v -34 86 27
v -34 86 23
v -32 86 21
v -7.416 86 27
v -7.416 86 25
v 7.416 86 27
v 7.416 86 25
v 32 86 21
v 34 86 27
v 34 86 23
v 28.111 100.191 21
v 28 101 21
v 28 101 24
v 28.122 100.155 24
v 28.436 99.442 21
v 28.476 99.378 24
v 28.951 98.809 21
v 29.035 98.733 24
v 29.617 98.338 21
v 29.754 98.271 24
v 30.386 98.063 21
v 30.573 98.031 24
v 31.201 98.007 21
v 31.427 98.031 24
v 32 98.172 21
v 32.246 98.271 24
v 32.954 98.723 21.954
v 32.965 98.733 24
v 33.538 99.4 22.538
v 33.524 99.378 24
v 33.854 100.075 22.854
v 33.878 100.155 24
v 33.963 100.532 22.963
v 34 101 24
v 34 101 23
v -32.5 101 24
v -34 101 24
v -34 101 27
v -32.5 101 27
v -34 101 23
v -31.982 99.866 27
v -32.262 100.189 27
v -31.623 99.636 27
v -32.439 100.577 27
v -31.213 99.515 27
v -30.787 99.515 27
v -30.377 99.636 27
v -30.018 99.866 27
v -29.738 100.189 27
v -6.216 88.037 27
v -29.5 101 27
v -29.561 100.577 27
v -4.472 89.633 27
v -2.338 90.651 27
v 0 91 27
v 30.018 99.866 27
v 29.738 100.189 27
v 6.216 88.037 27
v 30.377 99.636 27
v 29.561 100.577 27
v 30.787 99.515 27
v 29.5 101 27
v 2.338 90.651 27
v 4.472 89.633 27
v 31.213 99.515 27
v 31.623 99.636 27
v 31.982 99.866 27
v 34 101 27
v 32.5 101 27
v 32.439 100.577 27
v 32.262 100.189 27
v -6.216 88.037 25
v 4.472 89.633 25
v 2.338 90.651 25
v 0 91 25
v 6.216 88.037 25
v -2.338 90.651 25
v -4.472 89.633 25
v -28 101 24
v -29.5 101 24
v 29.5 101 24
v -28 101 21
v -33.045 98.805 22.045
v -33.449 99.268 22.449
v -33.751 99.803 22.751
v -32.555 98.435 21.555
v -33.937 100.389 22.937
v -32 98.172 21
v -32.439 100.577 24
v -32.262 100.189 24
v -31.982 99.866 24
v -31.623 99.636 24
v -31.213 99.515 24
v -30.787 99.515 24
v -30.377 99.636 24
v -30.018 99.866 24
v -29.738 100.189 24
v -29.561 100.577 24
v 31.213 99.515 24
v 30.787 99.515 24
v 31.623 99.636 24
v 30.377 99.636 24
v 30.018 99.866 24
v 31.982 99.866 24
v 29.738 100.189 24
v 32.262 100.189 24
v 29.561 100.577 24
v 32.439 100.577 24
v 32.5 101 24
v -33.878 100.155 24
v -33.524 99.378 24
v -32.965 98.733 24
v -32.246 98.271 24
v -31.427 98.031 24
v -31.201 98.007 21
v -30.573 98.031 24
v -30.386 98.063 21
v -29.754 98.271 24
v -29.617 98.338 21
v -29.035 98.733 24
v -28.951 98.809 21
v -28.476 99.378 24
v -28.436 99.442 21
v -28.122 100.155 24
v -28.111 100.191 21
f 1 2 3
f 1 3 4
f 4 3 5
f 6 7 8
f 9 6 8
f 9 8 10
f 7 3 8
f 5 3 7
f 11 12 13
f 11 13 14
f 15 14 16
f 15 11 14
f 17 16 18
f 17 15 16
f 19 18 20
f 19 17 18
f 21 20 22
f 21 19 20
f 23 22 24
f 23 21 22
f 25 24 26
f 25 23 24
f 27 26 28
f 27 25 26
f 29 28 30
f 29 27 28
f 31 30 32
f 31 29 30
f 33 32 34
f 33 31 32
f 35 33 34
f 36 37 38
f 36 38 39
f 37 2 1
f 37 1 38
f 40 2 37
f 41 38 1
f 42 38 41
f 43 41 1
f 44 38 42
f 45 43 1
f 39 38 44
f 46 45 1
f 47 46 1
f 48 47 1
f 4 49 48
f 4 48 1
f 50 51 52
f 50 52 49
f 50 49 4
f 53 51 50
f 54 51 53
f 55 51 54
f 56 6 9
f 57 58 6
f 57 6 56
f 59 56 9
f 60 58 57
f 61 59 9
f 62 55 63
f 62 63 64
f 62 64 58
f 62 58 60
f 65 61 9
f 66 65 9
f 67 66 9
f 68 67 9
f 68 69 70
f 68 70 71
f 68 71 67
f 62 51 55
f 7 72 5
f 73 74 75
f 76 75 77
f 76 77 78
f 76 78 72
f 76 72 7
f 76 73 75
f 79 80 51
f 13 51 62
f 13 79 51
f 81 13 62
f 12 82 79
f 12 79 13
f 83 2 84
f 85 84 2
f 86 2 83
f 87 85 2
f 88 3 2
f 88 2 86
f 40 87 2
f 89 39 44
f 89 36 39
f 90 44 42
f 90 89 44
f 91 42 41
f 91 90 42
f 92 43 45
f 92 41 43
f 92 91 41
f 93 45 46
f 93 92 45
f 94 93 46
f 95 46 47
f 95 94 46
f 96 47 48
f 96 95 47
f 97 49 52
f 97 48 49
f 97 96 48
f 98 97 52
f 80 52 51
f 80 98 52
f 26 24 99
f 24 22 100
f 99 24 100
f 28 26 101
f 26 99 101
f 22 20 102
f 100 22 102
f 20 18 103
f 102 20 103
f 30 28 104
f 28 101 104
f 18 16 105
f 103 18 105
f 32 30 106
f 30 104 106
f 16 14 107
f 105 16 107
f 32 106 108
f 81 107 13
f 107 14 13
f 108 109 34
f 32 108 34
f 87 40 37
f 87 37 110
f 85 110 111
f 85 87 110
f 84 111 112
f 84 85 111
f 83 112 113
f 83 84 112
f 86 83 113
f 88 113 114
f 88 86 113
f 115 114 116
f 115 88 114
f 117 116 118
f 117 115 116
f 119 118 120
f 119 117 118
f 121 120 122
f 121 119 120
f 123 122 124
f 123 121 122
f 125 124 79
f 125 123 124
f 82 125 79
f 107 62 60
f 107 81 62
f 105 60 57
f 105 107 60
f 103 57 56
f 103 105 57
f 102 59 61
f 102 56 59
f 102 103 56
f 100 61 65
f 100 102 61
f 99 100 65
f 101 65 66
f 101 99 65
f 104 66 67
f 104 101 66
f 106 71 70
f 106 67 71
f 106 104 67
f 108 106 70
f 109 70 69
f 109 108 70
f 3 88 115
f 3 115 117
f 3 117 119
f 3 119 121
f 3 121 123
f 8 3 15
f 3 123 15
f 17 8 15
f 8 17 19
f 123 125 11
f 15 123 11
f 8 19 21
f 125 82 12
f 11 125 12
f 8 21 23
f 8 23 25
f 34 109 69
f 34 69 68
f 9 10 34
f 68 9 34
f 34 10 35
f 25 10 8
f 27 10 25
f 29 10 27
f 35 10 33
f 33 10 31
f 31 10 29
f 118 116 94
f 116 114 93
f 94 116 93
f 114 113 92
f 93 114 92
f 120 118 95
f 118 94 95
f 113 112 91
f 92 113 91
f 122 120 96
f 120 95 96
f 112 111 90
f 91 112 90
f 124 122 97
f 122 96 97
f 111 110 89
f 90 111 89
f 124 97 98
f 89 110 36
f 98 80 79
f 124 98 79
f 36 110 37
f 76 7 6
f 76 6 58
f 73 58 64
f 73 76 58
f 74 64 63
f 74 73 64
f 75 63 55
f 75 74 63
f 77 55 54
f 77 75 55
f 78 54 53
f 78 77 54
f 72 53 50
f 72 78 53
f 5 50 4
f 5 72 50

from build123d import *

# Parameters (mm, degrees)
CYLINDER2097_R               = 1.5
CYLINDER2097_DEPTH           = 50
CYLINDER2097_PLACEMENT_ANGLE = 45
CYLINDER2083_R               = 1.5
CYLINDER2083_DEPTH           = 50
CYLINDER2083_PLACEMENT_ANGLE = 45
CYLINDER2096_R               = 1.5
CYLINDER2096_DEPTH           = 50
CYLINDER2096_PLACEMENT_ANGLE = 45
CYLINDER2092_R               = 1.5
CYLINDER2092_DEPTH           = 50
CYLINDER2092_PLACEMENT_ANGLE = 45
CYLINDER2095_R               = 1.5
CYLINDER2095_DEPTH           = 50
CYLINDER2095_PLACEMENT_ANGLE = 45
CYLINDER2094_R               = 1.5
CYLINDER2094_DEPTH           = 50
CYLINDER2094_PLACEMENT_ANGLE = 45
CYLINDER2076_R               = 3
CYLINDER2076_DEPTH           = 3
CYLINDER2076_PLACEMENT_ANGLE = 45
CYLINDER2065_R               = 3
CYLINDER2065_DEPTH           = 3
CYLINDER2065_PLACEMENT_ANGLE = 45
CYLINDER2074_R               = 3
CYLINDER2074_DEPTH           = 3
CYLINDER2074_PLACEMENT_ANGLE = 45
CYLINDER2064_R               = 3
CYLINDER2064_DEPTH           = 3
CYLINDER2064_PLACEMENT_ANGLE = 45
CYLINDER2063_R               = 3
CYLINDER2063_DEPTH           = 3
CYLINDER2063_PLACEMENT_ANGLE = 45
CYLINDER2070_R               = 3
CYLINDER2070_DEPTH           = 3
CYLINDER2070_PLACEMENT_ANGLE = 45
CYLINDER2071_R               = 8
CYLINDER2071_DEPTH           = 6
BOX989_W                     = 68
BOX989_H                     = 15
BOX989_DEPTH                 = 6
CHAMFER081_SIZE              = 2


with BuildPart() as v_lec2097:
    # Cylinder2097 → Cylinder2097 (new body)
    with BuildSketch(Plane.XY):
        Circle(CYLINDER2097_R)
    extrude(amount=CYLINDER2097_DEPTH)


with BuildPart() as v_lec2097_1:
    # Cylinder2097 placement: moved
    add(v_lec2097.part.moved(Location((20, 137, 0))).rotate(Axis((20, 137, 0), (0, 0, 1)), CYLINDER2097_PLACEMENT_ANGLE))


with BuildPart() as compound1087:
    # Cylinder2083 → Cylinder2083 (new body)
    with BuildSketch(Plane.XY):
        Circle(CYLINDER2083_R)
    extrude(amount=CYLINDER2083_DEPTH)


with BuildPart() as compound1087_1:
    # Cylinder2083 placement: moved
    add(compound1087.part.moved(Location((-20, 137, 0))).rotate(Axis((-20, 137, 0), (0, 0, 1)), CYLINDER2083_PLACEMENT_ANGLE))

    # Compound1087: union Válec2097
    add(v_lec2097_1.part)


with BuildPart() as v_lec2096:
    # Cylinder2096 → Cylinder2096 (new body)
    with BuildSketch(Plane.XY):
        Circle(CYLINDER2096_R)
    extrude(amount=CYLINDER2096_DEPTH)


with BuildPart() as v_lec2096_1:
    # Cylinder2096 placement: moved
    add(v_lec2096.part.moved(Location((31, 131, 0))).rotate(Axis((31, 131, 0), (0, 0, 1)), CYLINDER2096_PLACEMENT_ANGLE))


with BuildPart() as compound1088:
    # Cylinder2092 → Cylinder2092 (new body)
    with BuildSketch(Plane.XY):
        Circle(CYLINDER2092_R)
    extrude(amount=CYLINDER2092_DEPTH)


with BuildPart() as compound1088_1:
    # Cylinder2092 placement: moved
    add(compound1088.part.moved(Location((-31, 131, 0))).rotate(Axis((-31, 131, 0), (0, 0, 1)), CYLINDER2092_PLACEMENT_ANGLE))

    # Compound1088: union Válec2096
    add(v_lec2096_1.part)


with BuildPart() as v_lec2095:
    # Cylinder2095 → Cylinder2095 (new body)
    with BuildSketch(Plane.XY):
        Circle(CYLINDER2095_R)
    extrude(amount=CYLINDER2095_DEPTH)


with BuildPart() as v_lec2095_1:
    # Cylinder2095 placement: moved
    add(v_lec2095.part.moved(Location((31, 101, 0))).rotate(Axis((31, 101, 0), (0, 0, 1)), CYLINDER2095_PLACEMENT_ANGLE))


with BuildPart() as compound1110:
    # Cylinder2094 → Cylinder2094 (new body)
    with BuildSketch(Plane.XY):
        Circle(CYLINDER2094_R)
    extrude(amount=CYLINDER2094_DEPTH)


with BuildPart() as compound1110_1:
    # Cylinder2094 placement: moved
    add(compound1110.part.moved(Location((-31, 101, 0))).rotate(Axis((-31, 101, 0), (0, 0, 1)), CYLINDER2094_PLACEMENT_ANGLE))

    # Compound1112: union Válec2095
    add(v_lec2095_1.part)

    # Compound1110: union Compound1087, Compound1088
    add(compound1087_1.part)
    add(compound1088_1.part)


with BuildPart() as v_lec2076:
    # Cylinder2076 → Cylinder2076 (new body)
    with BuildSketch(Plane.XY):
        Circle(CYLINDER2076_R)
    extrude(amount=CYLINDER2076_DEPTH)


with BuildPart() as v_lec2076_1:
    # Cylinder2076 placement: moved
    add(v_lec2076.part.moved(Location((31, 131, 0))).rotate(Axis((31, 131, 0), (0, 0, 1)), CYLINDER2076_PLACEMENT_ANGLE))


with BuildPart() as compound1099:
    # Cylinder2065 → Cylinder2065 (new body)
    with BuildSketch(Plane.XY):
        Circle(CYLINDER2065_R)
    extrude(amount=CYLINDER2065_DEPTH)


with BuildPart() as compound1099_1:
    # Cylinder2065 placement: moved
    add(compound1099.part.moved(Location((-31, 131, 0))).rotate(Axis((-31, 131, 0), (0, 0, 1)), CYLINDER2065_PLACEMENT_ANGLE))

    # Compound1099: union Válec2076
    add(v_lec2076_1.part)


with BuildPart() as compound1099_2:
    # Compound1099 placement: moved
    add(compound1099_1.part.moved(Location((0, 0, 25))))


with BuildPart() as v_lec2074:
    # Cylinder2074 → Cylinder2074 (new body)
    with BuildSketch(Plane.XY):
        Circle(CYLINDER2074_R)
    extrude(amount=CYLINDER2074_DEPTH)


with BuildPart() as v_lec2074_1:
    # Cylinder2074 placement: moved
    add(v_lec2074.part.moved(Location((31, 101, 0))).rotate(Axis((31, 101, 0), (0, 0, 1)), CYLINDER2074_PLACEMENT_ANGLE))


with BuildPart() as compound1091:
    # Cylinder2064 → Cylinder2064 (new body)
    with BuildSketch(Plane.XY):
        Circle(CYLINDER2064_R)
    extrude(amount=CYLINDER2064_DEPTH)


with BuildPart() as compound1091_1:
    # Cylinder2064 placement: moved
    add(compound1091.part.moved(Location((-31, 101, 0))).rotate(Axis((-31, 101, 0), (0, 0, 1)), CYLINDER2064_PLACEMENT_ANGLE))

    # Compound1091: union Válec2074
    add(v_lec2074_1.part)


with BuildPart() as compound1091_2:
    # Compound1091 placement: moved
    add(compound1091_1.part.moved(Location((0, 0, 21))))


with BuildPart() as v_lec2063:
    # Cylinder2063 → Cylinder2063 (new body)
    with BuildSketch(Plane.XY):
        Circle(CYLINDER2063_R)
    extrude(amount=CYLINDER2063_DEPTH)


with BuildPart() as v_lec2063_1:
    # Cylinder2063 placement: moved
    add(v_lec2063.part.moved(Location((20, 137, 0))).rotate(Axis((20, 137, 0), (0, 0, 1)), CYLINDER2063_PLACEMENT_ANGLE))


with BuildPart() as compound1096:
    # Cylinder2070 → Cylinder2070 (new body)
    with BuildSketch(Plane.XY):
        Circle(CYLINDER2070_R)
    extrude(amount=CYLINDER2070_DEPTH)


with BuildPart() as compound1096_1:
    # Cylinder2070 placement: moved
    add(compound1096.part.moved(Location((-20, 137, 0))).rotate(Axis((-20, 137, 0), (0, 0, 1)), CYLINDER2070_PLACEMENT_ANGLE))

    # Compound1097: union Válec2063
    add(v_lec2063_1.part)


with BuildPart() as compound1096_2:
    # Compound1097 placement: moved
    add(compound1096_1.part.moved(Location((0, 0, 25))))

    # Compound1096: union Compound1099, Compound1091
    add(compound1099_2.part)
    add(compound1091_2.part)


with BuildPart() as v_lec2071:
    # Cylinder2071 → Cylinder2071 (new body)
    with BuildSketch(Plane(origin=(0, 83, 25), x_dir=(1, 0, 0), z_dir=(0, 0, 1))):
        Circle(CYLINDER2071_R)
    extrude(amount=CYLINDER2071_DEPTH)


with BuildPart() as cut690:
    # Box989 → Box989 (new body)
    with BuildSketch(Plane(origin=(-34, 86, 21), x_dir=(1, 0, 0), z_dir=(0, 0, 1))):
        with Locations((34, 7.5)):
            Rectangle(BOX989_W, BOX989_H)
    extrude(amount=BOX989_DEPTH)

    # Cut702: cut Válec2071
    add(v_lec2071.part, mode=Mode.SUBTRACT)

    # Cut700: cut Compound1096
    add(compound1096_2.part, mode=Mode.SUBTRACT)

    # Chamfer081
    chamfer081_edges = [cut690.edges().sort_by_distance(p)[0] for p in [
        (-34, 93.5, 21),
        (34, 93.5, 21),
    ]]
    chamfer(chamfer081_edges, length=CHAMFER081_SIZE)

    # Cut690: cut Compound1110
    add(compound1110_1.part, mode=Mode.SUBTRACT)


solid = cut690.part
